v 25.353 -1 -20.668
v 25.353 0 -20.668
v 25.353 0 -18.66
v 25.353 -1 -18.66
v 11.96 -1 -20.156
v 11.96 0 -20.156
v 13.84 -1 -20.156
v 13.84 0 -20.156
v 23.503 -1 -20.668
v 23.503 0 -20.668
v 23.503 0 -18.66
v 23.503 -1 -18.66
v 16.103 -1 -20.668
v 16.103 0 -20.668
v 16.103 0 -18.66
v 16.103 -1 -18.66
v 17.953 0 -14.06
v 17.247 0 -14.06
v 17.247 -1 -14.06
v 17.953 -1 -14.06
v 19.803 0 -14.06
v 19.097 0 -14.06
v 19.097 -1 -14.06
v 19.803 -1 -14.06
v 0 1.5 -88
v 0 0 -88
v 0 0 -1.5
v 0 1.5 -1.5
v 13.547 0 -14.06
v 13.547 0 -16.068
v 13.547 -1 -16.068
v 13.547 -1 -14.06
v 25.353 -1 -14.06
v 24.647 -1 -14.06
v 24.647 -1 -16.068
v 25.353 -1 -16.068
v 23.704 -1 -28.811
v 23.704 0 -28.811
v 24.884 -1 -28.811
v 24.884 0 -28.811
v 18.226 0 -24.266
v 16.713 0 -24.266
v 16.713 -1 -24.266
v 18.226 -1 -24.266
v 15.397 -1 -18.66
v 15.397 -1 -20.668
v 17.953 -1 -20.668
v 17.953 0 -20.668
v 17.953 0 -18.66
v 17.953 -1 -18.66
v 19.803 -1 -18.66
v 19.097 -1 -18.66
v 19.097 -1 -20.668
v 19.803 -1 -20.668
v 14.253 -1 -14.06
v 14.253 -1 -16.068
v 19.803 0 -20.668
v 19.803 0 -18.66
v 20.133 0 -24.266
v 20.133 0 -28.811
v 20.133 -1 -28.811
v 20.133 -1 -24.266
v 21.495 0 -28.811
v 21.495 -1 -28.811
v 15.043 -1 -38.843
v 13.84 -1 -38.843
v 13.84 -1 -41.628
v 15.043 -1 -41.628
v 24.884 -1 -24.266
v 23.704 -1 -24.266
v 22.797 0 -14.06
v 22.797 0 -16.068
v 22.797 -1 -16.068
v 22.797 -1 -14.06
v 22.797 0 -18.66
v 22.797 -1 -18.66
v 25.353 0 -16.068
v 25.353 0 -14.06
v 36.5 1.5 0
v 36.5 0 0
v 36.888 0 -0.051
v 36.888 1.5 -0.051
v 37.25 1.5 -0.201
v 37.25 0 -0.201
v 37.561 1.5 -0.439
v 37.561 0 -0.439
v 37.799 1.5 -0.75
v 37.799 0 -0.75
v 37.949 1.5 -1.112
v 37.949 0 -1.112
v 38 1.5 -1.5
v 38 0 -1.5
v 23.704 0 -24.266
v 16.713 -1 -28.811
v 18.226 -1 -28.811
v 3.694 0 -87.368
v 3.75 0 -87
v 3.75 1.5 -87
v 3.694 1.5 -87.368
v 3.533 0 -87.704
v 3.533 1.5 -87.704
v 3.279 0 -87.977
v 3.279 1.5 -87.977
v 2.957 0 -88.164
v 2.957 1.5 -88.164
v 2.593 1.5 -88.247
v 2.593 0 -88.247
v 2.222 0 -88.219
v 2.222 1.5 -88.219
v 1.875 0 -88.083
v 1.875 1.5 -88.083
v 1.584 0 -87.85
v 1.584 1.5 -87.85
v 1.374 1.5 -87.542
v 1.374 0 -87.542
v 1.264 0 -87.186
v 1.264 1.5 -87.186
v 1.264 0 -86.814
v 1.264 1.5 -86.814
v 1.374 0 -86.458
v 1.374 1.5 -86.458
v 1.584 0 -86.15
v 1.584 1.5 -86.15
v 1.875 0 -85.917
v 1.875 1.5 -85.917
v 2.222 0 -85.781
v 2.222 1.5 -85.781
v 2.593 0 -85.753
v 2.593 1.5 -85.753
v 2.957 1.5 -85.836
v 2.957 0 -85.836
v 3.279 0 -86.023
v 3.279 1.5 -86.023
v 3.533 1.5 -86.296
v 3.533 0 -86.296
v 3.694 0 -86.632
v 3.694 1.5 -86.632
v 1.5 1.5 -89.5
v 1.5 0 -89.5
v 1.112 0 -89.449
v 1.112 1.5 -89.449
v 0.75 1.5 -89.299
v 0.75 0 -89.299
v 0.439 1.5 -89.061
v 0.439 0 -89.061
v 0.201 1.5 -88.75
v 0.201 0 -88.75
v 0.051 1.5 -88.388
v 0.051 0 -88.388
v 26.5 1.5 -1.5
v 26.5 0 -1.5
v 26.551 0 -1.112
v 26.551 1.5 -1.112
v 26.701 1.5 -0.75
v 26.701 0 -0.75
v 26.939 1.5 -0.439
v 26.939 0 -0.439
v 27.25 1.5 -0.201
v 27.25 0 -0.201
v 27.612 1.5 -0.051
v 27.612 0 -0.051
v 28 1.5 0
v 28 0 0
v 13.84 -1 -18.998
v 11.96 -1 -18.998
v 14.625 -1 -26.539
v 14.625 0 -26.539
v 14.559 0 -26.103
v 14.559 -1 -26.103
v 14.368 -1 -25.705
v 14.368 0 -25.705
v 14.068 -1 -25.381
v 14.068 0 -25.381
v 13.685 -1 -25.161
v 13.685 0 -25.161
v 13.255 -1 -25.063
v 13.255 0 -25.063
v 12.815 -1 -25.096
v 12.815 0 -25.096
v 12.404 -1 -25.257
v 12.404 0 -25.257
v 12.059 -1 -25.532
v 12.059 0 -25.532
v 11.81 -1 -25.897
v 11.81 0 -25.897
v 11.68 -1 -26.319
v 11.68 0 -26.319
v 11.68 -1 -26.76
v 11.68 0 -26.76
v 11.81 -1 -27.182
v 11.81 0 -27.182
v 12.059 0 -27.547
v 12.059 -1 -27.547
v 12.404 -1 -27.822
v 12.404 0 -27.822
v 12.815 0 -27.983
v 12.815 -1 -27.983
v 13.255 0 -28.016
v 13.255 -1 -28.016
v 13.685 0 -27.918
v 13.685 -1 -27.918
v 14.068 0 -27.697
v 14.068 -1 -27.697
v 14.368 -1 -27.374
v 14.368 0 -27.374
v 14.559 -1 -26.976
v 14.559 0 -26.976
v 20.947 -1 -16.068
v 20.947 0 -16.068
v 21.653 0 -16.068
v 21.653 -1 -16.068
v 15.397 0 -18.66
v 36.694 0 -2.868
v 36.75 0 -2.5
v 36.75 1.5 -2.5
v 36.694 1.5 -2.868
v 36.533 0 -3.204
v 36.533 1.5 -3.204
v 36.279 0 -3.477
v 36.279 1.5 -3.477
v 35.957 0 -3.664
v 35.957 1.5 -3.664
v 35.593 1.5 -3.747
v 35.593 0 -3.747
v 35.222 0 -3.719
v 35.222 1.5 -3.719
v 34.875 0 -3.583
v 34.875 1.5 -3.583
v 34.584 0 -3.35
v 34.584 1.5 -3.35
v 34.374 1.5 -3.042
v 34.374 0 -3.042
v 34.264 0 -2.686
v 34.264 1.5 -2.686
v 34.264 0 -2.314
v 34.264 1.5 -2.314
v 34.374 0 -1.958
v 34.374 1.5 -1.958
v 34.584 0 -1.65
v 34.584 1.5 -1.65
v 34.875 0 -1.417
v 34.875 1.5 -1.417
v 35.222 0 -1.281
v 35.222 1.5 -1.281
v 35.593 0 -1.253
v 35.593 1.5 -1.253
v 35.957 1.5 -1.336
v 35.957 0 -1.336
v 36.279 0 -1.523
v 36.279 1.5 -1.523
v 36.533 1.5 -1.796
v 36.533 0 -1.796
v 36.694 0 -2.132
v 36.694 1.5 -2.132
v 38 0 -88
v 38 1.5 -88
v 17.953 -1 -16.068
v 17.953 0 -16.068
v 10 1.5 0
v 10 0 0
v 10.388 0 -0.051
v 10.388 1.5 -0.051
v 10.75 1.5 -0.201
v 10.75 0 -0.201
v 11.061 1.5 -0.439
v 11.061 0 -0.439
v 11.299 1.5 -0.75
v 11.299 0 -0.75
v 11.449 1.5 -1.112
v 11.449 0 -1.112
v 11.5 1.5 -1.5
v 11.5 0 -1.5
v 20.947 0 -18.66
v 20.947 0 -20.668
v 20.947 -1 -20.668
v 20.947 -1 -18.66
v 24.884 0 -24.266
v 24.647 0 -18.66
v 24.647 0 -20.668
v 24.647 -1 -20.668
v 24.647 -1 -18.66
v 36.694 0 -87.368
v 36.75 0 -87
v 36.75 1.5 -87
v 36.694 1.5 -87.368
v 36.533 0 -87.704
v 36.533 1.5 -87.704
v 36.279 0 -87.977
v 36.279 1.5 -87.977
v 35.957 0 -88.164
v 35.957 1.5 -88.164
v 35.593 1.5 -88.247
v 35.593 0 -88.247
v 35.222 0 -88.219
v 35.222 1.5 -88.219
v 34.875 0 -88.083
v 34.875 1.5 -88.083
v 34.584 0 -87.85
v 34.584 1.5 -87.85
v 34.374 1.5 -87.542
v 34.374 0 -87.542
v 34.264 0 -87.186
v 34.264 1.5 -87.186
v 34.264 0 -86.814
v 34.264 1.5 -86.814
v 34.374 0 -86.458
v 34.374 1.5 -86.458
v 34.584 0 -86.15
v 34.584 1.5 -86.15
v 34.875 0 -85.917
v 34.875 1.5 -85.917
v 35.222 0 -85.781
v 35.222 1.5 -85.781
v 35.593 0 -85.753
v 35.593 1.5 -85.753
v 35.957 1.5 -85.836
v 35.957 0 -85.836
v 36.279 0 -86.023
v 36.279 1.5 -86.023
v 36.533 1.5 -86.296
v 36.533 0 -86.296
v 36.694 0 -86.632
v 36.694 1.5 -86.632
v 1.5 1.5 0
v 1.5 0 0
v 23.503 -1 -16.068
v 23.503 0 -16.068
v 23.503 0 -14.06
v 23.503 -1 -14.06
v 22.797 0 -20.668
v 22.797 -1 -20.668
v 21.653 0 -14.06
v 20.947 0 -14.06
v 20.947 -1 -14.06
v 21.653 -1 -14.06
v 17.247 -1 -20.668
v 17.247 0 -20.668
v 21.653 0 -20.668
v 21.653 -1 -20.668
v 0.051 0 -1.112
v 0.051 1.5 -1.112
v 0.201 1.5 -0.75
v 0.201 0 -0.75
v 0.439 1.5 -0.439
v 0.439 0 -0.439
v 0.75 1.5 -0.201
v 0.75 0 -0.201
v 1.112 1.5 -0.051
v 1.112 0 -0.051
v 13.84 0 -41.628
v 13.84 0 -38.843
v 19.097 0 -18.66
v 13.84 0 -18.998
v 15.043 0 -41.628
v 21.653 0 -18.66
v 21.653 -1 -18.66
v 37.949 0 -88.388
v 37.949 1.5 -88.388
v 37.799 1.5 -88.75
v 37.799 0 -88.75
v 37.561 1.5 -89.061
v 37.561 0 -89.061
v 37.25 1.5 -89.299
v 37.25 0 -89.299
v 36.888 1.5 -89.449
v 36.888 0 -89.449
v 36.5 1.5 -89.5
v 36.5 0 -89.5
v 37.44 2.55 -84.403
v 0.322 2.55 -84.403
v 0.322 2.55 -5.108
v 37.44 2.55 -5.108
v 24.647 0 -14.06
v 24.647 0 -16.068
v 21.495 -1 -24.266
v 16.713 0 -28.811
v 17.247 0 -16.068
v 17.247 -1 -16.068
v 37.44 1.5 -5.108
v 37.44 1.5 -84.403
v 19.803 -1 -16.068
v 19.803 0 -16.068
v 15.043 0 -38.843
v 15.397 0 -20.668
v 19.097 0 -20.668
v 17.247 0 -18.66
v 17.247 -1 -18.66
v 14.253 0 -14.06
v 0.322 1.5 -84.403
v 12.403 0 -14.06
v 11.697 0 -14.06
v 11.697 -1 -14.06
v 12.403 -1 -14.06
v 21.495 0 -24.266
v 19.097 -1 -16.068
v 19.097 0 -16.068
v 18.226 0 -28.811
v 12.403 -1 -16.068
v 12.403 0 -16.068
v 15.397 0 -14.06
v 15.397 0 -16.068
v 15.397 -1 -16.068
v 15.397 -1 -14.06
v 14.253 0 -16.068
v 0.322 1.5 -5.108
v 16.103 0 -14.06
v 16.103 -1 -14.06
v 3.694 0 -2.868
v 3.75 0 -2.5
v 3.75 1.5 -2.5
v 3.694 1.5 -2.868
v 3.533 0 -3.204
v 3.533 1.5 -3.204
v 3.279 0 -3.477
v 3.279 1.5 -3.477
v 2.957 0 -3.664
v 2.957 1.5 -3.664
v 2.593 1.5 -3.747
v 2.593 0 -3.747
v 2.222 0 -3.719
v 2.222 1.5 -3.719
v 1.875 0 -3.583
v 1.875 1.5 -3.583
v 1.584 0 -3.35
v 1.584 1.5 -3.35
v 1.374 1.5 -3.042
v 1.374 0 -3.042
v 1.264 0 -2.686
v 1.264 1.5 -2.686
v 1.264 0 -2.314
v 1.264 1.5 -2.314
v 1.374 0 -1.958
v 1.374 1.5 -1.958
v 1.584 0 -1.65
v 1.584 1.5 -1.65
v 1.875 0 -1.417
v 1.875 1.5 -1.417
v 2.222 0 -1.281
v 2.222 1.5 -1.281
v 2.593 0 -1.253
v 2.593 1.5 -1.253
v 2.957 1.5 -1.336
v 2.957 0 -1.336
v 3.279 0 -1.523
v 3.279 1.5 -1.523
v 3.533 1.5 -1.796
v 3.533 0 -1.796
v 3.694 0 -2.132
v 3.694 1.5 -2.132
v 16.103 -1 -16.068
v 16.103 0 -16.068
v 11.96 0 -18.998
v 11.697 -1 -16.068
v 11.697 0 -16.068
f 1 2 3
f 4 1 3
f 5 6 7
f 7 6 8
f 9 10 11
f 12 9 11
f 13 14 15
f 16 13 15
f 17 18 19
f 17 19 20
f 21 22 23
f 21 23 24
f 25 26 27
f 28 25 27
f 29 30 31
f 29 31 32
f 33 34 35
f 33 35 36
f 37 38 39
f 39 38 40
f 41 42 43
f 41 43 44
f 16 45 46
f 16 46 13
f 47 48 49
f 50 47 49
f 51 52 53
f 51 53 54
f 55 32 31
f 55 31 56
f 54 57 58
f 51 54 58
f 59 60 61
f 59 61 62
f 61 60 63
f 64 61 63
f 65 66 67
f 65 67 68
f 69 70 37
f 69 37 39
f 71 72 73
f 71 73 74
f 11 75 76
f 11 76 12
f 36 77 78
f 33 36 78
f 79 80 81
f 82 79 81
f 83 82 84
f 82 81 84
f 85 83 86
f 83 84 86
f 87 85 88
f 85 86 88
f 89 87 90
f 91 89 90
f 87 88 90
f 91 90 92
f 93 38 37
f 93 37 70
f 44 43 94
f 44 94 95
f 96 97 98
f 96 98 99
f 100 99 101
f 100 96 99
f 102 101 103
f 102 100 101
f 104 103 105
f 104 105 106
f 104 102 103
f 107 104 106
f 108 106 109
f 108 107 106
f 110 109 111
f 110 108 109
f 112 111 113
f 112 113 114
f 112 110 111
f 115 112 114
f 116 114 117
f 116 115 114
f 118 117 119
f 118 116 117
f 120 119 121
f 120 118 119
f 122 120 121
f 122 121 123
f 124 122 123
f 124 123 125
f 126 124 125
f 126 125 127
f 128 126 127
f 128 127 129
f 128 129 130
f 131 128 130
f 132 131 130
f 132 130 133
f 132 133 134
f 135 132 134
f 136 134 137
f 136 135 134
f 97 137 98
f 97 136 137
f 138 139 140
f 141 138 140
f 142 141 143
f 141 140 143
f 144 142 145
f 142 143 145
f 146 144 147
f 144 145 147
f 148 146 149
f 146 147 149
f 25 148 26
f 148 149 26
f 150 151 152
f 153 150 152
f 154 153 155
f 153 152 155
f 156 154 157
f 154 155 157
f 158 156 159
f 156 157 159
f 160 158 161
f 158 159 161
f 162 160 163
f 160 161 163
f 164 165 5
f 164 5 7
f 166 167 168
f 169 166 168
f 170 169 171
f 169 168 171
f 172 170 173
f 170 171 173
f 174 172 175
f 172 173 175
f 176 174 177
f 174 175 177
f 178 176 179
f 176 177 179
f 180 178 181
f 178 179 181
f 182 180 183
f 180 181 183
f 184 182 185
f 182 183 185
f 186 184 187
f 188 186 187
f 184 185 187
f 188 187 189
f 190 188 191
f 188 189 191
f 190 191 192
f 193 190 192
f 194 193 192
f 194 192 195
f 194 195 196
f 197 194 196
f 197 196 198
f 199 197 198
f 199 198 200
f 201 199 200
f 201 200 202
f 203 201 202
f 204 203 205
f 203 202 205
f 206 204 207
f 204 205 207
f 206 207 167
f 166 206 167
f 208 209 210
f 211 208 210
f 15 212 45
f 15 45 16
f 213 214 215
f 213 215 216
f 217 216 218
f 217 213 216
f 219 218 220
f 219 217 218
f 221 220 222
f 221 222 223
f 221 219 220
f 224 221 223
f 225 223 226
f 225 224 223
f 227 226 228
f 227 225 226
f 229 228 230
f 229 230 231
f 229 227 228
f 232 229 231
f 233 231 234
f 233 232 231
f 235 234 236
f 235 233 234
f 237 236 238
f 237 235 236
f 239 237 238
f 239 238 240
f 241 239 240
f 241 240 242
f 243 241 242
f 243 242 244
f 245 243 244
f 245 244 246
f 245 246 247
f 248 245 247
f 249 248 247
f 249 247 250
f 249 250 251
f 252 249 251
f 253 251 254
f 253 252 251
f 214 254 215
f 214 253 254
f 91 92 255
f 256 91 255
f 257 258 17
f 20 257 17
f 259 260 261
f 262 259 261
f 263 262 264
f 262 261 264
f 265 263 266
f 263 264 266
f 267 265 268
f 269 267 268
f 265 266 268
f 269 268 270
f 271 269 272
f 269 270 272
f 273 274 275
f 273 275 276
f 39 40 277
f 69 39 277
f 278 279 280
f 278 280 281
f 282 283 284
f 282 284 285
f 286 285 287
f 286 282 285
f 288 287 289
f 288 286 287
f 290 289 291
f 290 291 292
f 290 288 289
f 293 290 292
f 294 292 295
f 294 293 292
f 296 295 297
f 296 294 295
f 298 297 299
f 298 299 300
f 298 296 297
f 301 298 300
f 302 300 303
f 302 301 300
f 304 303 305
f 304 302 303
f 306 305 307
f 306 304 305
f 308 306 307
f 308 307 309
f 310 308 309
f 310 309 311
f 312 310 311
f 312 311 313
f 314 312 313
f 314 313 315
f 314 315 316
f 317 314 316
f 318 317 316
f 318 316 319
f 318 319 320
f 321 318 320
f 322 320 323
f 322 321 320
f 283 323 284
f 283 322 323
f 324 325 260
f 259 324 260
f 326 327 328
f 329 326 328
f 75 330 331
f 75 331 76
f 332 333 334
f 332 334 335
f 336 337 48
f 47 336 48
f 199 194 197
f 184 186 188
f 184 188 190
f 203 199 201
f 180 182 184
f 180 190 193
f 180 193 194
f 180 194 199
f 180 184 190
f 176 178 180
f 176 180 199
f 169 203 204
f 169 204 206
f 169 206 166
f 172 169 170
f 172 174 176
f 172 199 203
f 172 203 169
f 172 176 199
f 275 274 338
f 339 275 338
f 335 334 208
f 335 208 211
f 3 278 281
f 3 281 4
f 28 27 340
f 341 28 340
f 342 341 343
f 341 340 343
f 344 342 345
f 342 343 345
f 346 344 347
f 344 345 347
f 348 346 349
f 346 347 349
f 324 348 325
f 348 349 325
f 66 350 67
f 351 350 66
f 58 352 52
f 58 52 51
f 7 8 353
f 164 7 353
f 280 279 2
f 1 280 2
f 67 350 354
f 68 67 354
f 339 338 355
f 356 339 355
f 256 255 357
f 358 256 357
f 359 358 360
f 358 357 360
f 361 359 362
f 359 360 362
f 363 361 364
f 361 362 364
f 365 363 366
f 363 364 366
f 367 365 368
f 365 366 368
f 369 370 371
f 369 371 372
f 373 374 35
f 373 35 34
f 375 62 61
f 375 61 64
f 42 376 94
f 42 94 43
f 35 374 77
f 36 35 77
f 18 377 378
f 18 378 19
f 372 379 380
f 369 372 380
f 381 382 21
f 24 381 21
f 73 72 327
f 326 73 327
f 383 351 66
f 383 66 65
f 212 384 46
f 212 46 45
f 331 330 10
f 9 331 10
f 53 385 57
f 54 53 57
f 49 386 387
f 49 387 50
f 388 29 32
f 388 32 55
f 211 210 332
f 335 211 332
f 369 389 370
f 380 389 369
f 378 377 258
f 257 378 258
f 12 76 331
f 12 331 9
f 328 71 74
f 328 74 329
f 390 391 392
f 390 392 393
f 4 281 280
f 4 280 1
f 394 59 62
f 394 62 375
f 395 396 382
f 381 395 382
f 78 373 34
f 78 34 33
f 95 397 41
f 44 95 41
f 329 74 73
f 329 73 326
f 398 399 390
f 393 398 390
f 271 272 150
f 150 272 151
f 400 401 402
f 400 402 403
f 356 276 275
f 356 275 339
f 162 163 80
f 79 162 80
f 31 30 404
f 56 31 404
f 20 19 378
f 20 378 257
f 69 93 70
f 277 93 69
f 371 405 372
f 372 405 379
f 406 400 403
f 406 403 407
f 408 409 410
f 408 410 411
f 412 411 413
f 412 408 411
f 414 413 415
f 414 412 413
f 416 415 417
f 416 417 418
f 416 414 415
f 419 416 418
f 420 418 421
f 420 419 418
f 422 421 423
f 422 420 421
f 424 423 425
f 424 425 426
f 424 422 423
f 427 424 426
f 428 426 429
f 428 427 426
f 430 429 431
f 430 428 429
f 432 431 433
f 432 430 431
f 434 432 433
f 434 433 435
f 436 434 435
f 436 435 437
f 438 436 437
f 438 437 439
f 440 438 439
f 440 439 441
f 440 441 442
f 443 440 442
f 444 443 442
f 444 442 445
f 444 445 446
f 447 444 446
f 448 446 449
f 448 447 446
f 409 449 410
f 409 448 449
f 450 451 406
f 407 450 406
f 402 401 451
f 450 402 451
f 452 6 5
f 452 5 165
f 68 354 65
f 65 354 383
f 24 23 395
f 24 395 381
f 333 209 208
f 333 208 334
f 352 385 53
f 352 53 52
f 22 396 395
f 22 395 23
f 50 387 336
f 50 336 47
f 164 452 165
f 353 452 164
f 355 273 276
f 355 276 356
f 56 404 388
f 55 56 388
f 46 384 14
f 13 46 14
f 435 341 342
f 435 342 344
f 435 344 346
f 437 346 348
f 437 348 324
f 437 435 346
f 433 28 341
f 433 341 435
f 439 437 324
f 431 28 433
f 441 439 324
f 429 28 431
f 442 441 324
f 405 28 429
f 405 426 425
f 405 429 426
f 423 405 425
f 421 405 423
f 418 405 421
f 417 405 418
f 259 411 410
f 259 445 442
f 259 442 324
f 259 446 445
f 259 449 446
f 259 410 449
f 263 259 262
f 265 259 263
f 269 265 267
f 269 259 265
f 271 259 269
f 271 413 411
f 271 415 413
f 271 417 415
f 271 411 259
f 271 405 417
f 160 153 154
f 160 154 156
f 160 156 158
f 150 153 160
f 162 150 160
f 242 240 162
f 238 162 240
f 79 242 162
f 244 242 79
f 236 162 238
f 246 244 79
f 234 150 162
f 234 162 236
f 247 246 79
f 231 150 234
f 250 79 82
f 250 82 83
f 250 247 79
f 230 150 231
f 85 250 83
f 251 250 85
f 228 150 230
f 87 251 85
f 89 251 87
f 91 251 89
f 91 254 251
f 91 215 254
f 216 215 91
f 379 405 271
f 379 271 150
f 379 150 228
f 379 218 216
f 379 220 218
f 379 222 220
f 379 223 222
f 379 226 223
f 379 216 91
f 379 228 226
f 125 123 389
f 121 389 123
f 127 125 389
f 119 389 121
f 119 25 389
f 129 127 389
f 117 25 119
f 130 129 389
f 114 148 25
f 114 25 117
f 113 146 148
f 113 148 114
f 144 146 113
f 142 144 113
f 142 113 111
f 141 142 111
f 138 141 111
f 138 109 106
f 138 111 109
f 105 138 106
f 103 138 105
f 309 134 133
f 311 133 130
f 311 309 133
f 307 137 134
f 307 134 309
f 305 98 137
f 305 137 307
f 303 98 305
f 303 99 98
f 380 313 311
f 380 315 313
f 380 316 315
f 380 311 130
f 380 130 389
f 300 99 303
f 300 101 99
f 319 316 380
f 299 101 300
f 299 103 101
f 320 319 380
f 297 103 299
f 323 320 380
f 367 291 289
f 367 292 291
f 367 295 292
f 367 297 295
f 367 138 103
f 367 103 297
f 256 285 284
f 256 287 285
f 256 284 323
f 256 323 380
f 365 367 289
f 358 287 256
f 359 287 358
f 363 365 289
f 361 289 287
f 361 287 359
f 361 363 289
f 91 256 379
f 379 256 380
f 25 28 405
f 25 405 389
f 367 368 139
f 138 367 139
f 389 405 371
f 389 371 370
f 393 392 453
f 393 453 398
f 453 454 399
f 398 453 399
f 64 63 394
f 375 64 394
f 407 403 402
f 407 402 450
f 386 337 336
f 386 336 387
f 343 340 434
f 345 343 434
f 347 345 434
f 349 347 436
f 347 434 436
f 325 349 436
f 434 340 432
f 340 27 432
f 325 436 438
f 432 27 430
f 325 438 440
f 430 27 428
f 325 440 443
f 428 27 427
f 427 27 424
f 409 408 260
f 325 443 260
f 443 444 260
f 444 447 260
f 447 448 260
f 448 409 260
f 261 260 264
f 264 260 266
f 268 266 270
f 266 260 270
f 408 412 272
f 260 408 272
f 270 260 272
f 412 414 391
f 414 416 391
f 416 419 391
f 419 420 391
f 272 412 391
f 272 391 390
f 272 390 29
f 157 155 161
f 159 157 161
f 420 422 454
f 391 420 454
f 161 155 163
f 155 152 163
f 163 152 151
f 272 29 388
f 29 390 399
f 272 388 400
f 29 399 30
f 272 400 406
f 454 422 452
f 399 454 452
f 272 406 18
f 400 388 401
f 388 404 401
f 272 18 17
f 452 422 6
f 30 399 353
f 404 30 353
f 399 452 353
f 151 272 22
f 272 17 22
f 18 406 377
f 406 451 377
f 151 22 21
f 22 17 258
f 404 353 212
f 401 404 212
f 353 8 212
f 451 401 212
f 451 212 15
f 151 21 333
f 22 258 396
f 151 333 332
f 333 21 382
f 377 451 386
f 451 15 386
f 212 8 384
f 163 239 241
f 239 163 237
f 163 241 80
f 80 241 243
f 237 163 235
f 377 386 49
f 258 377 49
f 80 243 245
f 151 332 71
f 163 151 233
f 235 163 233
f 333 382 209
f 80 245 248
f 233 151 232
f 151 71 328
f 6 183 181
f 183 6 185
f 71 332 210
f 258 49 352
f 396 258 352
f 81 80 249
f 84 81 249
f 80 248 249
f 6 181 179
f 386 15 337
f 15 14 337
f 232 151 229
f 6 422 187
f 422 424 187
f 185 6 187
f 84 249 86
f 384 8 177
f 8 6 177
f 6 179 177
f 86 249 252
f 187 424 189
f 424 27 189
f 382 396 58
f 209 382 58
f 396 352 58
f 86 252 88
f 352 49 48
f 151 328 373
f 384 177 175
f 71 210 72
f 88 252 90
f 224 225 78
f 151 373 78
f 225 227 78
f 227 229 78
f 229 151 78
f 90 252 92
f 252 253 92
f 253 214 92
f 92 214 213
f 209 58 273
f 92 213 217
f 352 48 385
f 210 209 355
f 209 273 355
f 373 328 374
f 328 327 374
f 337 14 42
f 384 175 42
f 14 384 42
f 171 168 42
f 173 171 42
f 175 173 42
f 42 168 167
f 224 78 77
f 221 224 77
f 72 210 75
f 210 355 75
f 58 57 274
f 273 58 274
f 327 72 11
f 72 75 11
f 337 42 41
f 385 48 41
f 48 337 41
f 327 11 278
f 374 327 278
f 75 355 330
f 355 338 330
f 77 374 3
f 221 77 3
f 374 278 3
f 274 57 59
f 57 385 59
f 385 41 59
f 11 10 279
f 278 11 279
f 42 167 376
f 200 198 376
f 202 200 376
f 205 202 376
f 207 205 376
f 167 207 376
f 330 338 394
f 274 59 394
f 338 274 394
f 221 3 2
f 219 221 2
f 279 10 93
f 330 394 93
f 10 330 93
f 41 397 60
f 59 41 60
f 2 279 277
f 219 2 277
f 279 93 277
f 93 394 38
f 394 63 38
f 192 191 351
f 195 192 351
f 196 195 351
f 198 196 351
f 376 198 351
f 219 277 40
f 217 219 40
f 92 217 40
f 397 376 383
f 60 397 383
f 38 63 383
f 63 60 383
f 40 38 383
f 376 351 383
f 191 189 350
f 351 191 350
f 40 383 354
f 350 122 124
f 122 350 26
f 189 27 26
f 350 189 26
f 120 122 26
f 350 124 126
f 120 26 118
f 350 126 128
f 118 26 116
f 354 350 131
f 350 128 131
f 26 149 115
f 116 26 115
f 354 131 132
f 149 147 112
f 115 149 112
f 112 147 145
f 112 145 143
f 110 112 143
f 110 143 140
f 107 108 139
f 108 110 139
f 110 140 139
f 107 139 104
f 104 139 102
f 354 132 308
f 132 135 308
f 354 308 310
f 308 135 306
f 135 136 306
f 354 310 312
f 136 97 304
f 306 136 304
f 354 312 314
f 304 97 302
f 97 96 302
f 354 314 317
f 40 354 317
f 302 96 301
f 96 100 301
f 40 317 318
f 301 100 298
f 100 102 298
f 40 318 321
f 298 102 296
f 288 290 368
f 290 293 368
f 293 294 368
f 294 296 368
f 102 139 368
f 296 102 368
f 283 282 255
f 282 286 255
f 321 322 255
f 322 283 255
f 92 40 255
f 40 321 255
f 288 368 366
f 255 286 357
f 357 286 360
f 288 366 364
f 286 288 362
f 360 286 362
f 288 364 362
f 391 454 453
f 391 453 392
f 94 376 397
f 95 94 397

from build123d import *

# Parameters (mm, degrees)
SKETCH1_R           = 1.25
BOSS_EXTRUDE1_DEPTH = 1.5
SKETCH2_W           = 37.118680969
SKETCH2_H           = 79.295382989
BOSS_EXTRUDE2_DEPTH = 1.05
SKETCH3_R           = 1.480960071
SKETCH3_W           = 0.706323155
SKETCH3_H           = 2.007969185
SKETCH3_W_2         = 1.202782264
SKETCH3_H_2         = 2.785488108
SKETCH3_W_3         = 1.512629418
SKETCH3_H_3         = 4.544655772
SKETCH3_W_4         = 1.362329437
SKETCH3_W_5         = 1.179692139
SKETCH3_W_6         = 1.879481301
SKETCH3_H_4         = 1.158224536
BOSS_EXTRUDE3_DEPTH = 1


with BuildPart() as part:
    # Sketch1 → Boss-Extrude1 (new body)
    with BuildSketch(Plane(origin=(0, 0, 0), x_dir=(1, 0, 0), z_dir=(0, 1, 0))):
        with BuildLine():
            Line((1.5, 0), (10, 0))
            ThreePointArc((10, 0), (11.060660172, 0.439339828), (11.5, 1.5))
            Line((11.5, 1.5), (26.5, 1.5))
            ThreePointArc((26.5, 1.5), (26.939339828, 0.439339828), (28, 0))
            Line((28, 0), (36.5, 0))
            ThreePointArc((36.5, 0), (37.560660172, 0.439339828), (38, 1.5))
            Line((38, 1.5), (38, 88))
            ThreePointArc((38, 88), (37.560660172, 89.060660172), (36.5, 89.5))
            Line((36.5, 89.5), (1.5, 89.5))
            ThreePointArc((1.5, 89.5), (0.439339828, 89.060660172), (0, 88))
            Line((0, 88), (0, 1.5))
            ThreePointArc((0, 1.5), (0.439339828, 0.439339828), (1.5, 0))
        make_face()
        with Locations((2.5, 2.5)):
            Circle(SKETCH1_R, mode=Mode.SUBTRACT)
        with Locations((35.5, 2.5)):
            Circle(SKETCH1_R, mode=Mode.SUBTRACT)
        with Locations((35.5, 87)):
            Circle(SKETCH1_R, mode=Mode.SUBTRACT)
        with Locations((2.5, 87)):
            Circle(SKETCH1_R, mode=Mode.SUBTRACT)
    extrude(amount=BOSS_EXTRUDE1_DEPTH)

    # Sketch2 → Boss-Extrude2 (add)
    with BuildSketch(Plane(origin=(0, 1.5, 0), x_dir=(1, 0, 0), z_dir=(0, 1, 0))):
        with Locations((18.880991901, 44.755610098)):
            Rectangle(SKETCH2_W, SKETCH2_H)
    extrude(amount=BOSS_EXTRUDE2_DEPTH)

    # Sketch3 → Boss-Extrude3 (add)
    with BuildSketch(Plane.XZ):
        with Locations((13.144272763, -26.539340378)):
            Circle(SKETCH3_R)
        with Locations((23.149698331, -19.663516122)):
            Rectangle(SKETCH3_W, SKETCH3_H)
        with Locations((14.4411934, -40.235350725)):
            Rectangle(SKETCH3_W_2, SKETCH3_H_2)
        with Locations((17.469755638, -26.538684778)):
            Rectangle(SKETCH3_W_3, SKETCH3_H_3)
        with Locations((20.813975953, -26.538684778)):
            Rectangle(SKETCH3_W_4, SKETCH3_H_3)
        with Locations((24.294071036, -26.538684778)):
            Rectangle(SKETCH3_W_5, SKETCH3_H_3)
        with Locations((24.999698331, -19.663516122)):
            Rectangle(SKETCH3_W, SKETCH3_H)
        with Locations((21.299698331, -19.663516122)):
            Rectangle(SKETCH3_W, SKETCH3_H)
        with Locations((19.449698331, -19.663516122)):
            Rectangle(SKETCH3_W, SKETCH3_H)
        with Locations((17.599698331, -19.663516122)):
            Rectangle(SKETCH3_W, SKETCH3_H)
        with Locations((15.749698331, -19.663516122)):
            Rectangle(SKETCH3_W, SKETCH3_H)
        with Locations((12.900061618, -19.576771436)):
            Rectangle(SKETCH3_W_6, SKETCH3_H_4)
        with Locations((23.149698331, -15.063516122)):
            Rectangle(SKETCH3_W, SKETCH3_H)
        with Locations((21.299698331, -15.063516122)):
            Rectangle(SKETCH3_W, SKETCH3_H)
        with Locations((19.449698331, -15.063516122)):
            Rectangle(SKETCH3_W, SKETCH3_H)
        with Locations((17.599698331, -15.063516122)):
            Rectangle(SKETCH3_W, SKETCH3_H)
        with Locations((15.749698331, -15.063516122)):
            Rectangle(SKETCH3_W, SKETCH3_H)
        with Locations((13.899698331, -15.063516122)):
            Rectangle(SKETCH3_W, SKETCH3_H)
        with Locations((12.049698331, -15.063516122)):
            Rectangle(SKETCH3_W, SKETCH3_H)
        with Locations((24.999698331, -15.063516122)):
            Rectangle(SKETCH3_W, SKETCH3_H)
    extrude(amount=BOSS_EXTRUDE3_DEPTH)


solid = part.part
